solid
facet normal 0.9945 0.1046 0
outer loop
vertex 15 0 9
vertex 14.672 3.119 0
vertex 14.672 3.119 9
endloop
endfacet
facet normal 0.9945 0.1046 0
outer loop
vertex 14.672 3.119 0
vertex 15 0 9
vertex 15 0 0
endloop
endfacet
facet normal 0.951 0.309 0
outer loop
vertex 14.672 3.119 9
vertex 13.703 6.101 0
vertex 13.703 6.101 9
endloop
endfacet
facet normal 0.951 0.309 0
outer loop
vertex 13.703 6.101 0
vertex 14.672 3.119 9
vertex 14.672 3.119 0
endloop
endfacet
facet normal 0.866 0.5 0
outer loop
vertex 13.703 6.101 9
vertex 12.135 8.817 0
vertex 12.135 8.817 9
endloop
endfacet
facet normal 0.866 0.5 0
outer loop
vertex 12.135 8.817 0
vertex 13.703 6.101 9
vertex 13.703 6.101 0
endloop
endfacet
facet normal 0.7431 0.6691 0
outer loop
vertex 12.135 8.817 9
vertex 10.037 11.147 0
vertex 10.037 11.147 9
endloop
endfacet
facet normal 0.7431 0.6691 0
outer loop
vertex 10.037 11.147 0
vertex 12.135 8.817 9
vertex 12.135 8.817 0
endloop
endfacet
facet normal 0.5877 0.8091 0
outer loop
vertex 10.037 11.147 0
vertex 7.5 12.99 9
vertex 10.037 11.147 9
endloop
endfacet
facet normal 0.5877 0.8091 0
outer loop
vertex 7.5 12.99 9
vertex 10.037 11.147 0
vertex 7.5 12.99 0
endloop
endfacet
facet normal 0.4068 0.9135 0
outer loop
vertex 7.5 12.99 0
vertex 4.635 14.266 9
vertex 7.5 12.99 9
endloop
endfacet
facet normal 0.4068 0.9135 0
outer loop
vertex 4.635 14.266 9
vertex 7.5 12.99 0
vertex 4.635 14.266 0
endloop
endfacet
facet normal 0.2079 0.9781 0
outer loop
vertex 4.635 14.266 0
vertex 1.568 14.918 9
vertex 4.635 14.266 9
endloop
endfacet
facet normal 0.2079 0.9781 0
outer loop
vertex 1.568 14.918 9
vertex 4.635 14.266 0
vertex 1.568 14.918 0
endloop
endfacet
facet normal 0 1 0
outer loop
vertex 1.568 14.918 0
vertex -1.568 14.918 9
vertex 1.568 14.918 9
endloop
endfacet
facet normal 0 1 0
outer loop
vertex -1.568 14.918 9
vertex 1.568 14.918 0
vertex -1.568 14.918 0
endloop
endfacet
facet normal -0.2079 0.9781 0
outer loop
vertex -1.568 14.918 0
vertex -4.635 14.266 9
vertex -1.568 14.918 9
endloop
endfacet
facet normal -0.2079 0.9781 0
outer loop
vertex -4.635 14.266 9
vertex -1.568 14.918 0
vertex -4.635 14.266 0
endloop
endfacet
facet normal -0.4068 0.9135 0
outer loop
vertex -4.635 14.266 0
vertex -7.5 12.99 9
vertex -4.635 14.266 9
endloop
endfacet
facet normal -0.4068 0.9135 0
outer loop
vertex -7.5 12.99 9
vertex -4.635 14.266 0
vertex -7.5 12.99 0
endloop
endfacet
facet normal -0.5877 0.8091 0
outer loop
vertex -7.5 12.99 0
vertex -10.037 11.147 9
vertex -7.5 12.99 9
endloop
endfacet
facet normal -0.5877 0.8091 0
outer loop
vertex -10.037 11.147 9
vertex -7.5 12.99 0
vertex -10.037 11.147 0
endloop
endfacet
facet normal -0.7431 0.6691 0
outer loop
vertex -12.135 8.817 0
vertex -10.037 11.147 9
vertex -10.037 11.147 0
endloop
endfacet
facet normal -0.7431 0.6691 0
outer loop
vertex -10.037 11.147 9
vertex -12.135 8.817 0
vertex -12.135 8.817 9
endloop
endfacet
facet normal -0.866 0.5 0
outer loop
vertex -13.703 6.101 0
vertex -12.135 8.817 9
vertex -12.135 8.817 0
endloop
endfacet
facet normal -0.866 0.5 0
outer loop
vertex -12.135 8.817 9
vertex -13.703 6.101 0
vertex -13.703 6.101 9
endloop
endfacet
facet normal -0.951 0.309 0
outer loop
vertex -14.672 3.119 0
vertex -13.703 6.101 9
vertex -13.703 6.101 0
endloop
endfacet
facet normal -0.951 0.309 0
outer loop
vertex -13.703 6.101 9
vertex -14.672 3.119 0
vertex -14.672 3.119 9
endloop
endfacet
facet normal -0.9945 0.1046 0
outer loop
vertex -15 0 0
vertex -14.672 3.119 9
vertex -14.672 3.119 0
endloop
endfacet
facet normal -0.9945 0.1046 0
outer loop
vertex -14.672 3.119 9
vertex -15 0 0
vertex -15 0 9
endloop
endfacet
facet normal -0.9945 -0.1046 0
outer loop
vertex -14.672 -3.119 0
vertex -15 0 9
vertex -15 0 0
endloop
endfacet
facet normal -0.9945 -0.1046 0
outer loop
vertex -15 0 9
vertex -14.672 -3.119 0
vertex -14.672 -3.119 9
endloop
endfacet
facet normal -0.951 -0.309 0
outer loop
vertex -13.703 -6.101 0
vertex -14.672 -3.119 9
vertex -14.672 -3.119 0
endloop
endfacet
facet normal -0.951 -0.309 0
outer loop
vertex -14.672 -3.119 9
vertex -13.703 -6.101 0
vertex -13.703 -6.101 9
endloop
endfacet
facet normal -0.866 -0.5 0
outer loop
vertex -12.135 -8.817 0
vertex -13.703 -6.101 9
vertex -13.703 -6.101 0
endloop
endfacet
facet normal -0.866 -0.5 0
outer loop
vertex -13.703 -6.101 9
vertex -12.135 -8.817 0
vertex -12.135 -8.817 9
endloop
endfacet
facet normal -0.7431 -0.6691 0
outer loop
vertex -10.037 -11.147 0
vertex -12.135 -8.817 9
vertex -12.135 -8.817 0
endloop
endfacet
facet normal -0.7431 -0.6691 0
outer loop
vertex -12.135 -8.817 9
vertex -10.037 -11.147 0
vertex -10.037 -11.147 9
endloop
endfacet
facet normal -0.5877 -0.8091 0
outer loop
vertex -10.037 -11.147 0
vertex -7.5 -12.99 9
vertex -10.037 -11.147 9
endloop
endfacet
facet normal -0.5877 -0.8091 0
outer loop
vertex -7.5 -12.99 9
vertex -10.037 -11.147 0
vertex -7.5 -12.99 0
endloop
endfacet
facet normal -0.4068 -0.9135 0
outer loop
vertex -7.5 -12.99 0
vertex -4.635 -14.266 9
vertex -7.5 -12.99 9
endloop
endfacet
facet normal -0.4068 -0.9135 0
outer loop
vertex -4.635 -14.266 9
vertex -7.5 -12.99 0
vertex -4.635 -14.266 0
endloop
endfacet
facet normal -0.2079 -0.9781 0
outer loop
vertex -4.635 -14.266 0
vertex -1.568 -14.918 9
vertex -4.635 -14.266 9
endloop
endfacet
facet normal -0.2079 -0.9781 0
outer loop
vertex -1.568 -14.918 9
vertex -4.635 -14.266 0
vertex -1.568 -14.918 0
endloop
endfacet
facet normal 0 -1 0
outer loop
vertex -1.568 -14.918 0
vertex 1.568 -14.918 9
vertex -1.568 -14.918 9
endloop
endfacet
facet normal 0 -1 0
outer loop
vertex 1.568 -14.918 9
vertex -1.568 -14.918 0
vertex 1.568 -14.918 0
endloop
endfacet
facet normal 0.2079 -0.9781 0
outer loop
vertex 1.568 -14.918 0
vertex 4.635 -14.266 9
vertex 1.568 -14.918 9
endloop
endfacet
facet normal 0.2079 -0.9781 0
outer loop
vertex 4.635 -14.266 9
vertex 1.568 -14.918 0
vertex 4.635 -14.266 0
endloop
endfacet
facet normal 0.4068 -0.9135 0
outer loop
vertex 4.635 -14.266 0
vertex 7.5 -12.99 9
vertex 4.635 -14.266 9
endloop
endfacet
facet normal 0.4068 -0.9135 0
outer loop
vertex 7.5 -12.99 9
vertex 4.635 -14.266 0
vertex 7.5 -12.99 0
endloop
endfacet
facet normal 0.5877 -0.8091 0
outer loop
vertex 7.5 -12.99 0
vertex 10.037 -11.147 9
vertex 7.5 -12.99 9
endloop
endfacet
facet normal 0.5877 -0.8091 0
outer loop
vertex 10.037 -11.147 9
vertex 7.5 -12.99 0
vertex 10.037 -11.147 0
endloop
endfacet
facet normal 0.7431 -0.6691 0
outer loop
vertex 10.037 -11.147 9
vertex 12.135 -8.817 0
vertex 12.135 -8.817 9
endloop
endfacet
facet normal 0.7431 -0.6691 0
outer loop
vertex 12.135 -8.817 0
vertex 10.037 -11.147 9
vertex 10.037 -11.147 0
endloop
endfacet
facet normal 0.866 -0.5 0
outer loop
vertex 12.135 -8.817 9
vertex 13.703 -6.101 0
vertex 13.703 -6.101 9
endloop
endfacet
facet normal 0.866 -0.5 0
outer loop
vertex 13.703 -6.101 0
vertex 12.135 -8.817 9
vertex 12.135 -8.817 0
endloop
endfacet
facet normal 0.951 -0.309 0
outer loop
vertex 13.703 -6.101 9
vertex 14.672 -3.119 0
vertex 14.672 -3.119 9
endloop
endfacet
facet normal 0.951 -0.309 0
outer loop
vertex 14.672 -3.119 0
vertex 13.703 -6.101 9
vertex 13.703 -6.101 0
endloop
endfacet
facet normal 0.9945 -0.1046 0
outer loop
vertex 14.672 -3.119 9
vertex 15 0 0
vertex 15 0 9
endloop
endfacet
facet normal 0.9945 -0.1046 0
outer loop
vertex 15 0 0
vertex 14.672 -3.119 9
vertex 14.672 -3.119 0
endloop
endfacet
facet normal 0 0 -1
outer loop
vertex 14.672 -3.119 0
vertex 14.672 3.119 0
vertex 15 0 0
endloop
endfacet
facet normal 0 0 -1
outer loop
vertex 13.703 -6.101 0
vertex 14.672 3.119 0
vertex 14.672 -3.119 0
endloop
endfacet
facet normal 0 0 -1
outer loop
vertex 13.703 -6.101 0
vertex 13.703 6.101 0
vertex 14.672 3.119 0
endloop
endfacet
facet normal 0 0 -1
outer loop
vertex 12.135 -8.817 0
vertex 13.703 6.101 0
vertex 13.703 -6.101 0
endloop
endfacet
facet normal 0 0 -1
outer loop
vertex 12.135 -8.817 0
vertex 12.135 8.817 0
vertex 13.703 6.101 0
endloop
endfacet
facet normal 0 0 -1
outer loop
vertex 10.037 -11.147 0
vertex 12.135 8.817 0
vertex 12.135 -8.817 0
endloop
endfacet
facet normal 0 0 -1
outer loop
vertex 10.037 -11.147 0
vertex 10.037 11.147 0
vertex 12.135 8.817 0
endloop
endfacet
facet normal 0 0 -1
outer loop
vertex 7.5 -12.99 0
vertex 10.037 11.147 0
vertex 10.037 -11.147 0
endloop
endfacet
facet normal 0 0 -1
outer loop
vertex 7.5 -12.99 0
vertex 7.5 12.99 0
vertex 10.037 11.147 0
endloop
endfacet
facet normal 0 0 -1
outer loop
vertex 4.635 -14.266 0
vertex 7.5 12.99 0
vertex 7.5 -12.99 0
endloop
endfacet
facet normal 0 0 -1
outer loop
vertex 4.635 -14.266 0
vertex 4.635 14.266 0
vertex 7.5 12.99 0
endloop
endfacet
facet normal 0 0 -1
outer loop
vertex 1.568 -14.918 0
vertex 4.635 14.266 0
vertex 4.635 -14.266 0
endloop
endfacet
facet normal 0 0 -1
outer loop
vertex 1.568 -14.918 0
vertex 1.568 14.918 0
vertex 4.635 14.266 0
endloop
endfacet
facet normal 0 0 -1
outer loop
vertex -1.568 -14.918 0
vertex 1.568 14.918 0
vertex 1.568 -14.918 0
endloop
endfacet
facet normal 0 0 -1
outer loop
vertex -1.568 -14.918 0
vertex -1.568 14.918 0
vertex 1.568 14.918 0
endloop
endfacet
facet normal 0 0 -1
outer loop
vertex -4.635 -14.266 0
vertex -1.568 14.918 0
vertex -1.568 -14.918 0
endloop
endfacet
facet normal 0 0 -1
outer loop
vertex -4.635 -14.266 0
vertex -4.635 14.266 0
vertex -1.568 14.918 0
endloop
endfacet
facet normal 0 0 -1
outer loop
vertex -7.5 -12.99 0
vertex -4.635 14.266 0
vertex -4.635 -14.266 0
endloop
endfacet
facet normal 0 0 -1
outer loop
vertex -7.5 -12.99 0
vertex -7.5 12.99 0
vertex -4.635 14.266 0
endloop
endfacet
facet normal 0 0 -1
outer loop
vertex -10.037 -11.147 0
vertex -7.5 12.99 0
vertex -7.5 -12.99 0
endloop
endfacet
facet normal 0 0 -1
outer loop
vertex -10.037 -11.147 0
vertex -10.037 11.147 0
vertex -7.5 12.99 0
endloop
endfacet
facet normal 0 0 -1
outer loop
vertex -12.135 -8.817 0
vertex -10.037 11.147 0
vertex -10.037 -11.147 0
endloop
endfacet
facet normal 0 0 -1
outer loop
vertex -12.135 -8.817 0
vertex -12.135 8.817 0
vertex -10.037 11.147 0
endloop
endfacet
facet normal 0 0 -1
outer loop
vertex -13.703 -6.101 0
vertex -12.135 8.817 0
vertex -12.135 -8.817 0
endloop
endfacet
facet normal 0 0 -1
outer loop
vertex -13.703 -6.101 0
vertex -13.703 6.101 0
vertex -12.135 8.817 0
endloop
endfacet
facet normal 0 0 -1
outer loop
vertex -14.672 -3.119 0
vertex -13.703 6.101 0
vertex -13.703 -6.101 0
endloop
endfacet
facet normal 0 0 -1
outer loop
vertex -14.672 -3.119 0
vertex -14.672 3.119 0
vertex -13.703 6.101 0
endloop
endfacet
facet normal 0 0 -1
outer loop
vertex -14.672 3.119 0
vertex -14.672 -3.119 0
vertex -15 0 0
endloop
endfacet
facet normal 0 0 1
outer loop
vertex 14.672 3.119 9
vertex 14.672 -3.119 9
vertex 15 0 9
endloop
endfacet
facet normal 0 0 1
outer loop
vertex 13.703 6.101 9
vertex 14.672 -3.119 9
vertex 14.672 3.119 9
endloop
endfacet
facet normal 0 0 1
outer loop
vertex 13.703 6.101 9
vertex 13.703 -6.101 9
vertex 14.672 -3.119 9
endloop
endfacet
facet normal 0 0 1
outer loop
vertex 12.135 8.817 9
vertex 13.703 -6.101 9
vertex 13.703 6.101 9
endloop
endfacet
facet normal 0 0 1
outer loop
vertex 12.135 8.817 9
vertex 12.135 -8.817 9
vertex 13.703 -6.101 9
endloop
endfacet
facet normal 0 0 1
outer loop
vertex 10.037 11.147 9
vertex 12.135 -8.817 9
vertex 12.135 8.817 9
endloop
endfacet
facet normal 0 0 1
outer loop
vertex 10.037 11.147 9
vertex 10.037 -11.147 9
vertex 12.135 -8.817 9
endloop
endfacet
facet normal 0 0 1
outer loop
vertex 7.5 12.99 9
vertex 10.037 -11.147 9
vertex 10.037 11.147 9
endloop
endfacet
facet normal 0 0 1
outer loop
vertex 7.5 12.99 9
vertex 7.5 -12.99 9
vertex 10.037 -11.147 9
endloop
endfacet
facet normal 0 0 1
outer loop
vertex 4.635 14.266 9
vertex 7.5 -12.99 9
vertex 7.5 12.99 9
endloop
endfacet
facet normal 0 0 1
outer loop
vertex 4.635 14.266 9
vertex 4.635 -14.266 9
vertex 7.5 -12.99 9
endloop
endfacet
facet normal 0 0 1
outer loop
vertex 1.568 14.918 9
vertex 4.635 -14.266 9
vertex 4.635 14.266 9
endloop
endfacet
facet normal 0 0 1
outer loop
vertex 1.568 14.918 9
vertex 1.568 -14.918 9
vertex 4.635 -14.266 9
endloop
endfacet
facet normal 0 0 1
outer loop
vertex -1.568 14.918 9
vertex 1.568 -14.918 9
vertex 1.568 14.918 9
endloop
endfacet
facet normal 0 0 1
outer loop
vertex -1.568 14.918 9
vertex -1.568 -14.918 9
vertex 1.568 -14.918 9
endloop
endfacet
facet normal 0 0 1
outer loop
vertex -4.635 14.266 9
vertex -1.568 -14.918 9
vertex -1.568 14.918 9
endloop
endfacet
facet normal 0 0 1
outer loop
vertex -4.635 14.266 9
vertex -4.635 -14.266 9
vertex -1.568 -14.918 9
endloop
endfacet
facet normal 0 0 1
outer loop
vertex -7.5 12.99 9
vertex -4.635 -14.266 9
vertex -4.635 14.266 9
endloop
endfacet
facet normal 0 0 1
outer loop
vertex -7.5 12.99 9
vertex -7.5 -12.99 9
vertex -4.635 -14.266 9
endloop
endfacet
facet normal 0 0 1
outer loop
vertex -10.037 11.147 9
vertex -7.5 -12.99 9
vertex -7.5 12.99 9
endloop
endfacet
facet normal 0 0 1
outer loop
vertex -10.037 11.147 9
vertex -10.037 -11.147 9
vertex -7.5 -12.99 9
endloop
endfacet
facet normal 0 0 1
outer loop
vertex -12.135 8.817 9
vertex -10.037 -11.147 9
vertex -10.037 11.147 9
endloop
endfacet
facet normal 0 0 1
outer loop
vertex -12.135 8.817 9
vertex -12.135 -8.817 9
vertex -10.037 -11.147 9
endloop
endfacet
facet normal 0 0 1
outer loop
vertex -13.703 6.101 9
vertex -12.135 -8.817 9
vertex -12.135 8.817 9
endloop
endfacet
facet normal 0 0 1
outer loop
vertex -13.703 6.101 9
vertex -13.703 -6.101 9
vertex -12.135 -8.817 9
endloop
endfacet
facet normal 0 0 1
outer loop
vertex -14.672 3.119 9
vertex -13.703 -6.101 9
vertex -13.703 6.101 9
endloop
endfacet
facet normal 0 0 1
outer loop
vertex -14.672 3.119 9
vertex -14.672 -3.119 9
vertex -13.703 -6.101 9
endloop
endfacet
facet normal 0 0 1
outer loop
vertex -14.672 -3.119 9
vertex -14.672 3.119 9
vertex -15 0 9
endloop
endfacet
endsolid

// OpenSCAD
// Generated by SolidPython 1.0.1 on 2020-07-29 00:39:25


cylinder(h = 9, r1 = 15, r2 = 15);
/***********************************************
*********      SolidPython code:      **********
************************************************
 
# import packages: SolidPython
from solid import *
from solid.utils import *
from itertools import chain, combinations


class Resize:

    def __init__(self, scad_file):
        self.scad_file = scad_file
        #self.scad_file = import_scad(scad_file)
        # cone/cylinder param:
        self.r1 = 0
        self.r2 = 0
        self.h = 0
        # rectangular prism param:
        self.w = 0
        self.l = 0
        # ellipse param:
        self.r = 0

    # import OpenScad code (file name corresponds to shape)


    # classify shape + parameters
    def assign(self, param1, param2, param3):
        if self.scad_file == 'cone.scad':
            self.r1 = param1
            self.r2 = param2
            self.h = param3
        elif self.scad_file == 'cylinder.scad':
            self.r1 = param1
            self.r2 = param2
            self.h = param3
        elif self.scad_file == 'rectangularPrism.scad':
            self.h = param1
            self.l = param2
            self.w = param3
        else:
            self.r = param1
            self.h = param2

    # resize parameters
    def iterate(self):
        x = range(3, 20, 2)
        i = 1
        if self.scad_file == 'cone.scad':
            tempList = list(combinations(x, 2))
            for temp in tempList:
                param1 = temp[0]
                param2 = temp[1]
                filepath = 'produced_scad_files/' + 'cone' + str(param1) + '_' + str(param2) + '_' + '.scad'
                scad_render_to_file(cylinder(h=param1, r1=param2, r2=0), filepath)

        elif self.scad_file == 'cylinder.scad':
            tempList = list(combinations(x, 3))
            for temp in tempList:
                param1 = temp[0]
                param2 = temp[1]
                filepath = 'produced_scad_files/' + 'cylinder' + str(param1) + '_' + str(param2) + '_' + '.scad'
                scad_render_to_file(cylinder(h=param1, r1=param2, r2=param2), filepath)

        elif self.scad_file == 'rectangularPrism.scad':
            tempList = list(combinations(x, 3))
            for temp in tempList:
                param1 = temp[0]
                param2 = temp[1]
                param3 = temp[2]
                filepath = 'produced_scad_files/' + 'rectangularPrism' + str(param1) + '_' + str(param2) + '_' + str(
                    param3) + '.scad'
                scad_render_to_file(cube(size=(param1, param2, param3)), filepath)

        elif self.scad_file == 'ellipse.scad':
            tempList = list(combinations(x, 4))
            for temp in tempList:
                param1 = temp[0]
                param2 = temp[1]
                param3 = temp[2]
                param4 = temp[3]
                filepath = 'produced_scad_files/' + 'ellipse' + str(param1) + '_' + str(param2) + '_' + str(param3) + '_' + str(param4) + '.scad'
                scad_render_to_file(scale([param1, param2, param3])(sphere(r=param4)), filepath)

    def render_to_scadfile(self):
        scad_render_to_file(scad, 'example.scad') 
 
************************************************/
